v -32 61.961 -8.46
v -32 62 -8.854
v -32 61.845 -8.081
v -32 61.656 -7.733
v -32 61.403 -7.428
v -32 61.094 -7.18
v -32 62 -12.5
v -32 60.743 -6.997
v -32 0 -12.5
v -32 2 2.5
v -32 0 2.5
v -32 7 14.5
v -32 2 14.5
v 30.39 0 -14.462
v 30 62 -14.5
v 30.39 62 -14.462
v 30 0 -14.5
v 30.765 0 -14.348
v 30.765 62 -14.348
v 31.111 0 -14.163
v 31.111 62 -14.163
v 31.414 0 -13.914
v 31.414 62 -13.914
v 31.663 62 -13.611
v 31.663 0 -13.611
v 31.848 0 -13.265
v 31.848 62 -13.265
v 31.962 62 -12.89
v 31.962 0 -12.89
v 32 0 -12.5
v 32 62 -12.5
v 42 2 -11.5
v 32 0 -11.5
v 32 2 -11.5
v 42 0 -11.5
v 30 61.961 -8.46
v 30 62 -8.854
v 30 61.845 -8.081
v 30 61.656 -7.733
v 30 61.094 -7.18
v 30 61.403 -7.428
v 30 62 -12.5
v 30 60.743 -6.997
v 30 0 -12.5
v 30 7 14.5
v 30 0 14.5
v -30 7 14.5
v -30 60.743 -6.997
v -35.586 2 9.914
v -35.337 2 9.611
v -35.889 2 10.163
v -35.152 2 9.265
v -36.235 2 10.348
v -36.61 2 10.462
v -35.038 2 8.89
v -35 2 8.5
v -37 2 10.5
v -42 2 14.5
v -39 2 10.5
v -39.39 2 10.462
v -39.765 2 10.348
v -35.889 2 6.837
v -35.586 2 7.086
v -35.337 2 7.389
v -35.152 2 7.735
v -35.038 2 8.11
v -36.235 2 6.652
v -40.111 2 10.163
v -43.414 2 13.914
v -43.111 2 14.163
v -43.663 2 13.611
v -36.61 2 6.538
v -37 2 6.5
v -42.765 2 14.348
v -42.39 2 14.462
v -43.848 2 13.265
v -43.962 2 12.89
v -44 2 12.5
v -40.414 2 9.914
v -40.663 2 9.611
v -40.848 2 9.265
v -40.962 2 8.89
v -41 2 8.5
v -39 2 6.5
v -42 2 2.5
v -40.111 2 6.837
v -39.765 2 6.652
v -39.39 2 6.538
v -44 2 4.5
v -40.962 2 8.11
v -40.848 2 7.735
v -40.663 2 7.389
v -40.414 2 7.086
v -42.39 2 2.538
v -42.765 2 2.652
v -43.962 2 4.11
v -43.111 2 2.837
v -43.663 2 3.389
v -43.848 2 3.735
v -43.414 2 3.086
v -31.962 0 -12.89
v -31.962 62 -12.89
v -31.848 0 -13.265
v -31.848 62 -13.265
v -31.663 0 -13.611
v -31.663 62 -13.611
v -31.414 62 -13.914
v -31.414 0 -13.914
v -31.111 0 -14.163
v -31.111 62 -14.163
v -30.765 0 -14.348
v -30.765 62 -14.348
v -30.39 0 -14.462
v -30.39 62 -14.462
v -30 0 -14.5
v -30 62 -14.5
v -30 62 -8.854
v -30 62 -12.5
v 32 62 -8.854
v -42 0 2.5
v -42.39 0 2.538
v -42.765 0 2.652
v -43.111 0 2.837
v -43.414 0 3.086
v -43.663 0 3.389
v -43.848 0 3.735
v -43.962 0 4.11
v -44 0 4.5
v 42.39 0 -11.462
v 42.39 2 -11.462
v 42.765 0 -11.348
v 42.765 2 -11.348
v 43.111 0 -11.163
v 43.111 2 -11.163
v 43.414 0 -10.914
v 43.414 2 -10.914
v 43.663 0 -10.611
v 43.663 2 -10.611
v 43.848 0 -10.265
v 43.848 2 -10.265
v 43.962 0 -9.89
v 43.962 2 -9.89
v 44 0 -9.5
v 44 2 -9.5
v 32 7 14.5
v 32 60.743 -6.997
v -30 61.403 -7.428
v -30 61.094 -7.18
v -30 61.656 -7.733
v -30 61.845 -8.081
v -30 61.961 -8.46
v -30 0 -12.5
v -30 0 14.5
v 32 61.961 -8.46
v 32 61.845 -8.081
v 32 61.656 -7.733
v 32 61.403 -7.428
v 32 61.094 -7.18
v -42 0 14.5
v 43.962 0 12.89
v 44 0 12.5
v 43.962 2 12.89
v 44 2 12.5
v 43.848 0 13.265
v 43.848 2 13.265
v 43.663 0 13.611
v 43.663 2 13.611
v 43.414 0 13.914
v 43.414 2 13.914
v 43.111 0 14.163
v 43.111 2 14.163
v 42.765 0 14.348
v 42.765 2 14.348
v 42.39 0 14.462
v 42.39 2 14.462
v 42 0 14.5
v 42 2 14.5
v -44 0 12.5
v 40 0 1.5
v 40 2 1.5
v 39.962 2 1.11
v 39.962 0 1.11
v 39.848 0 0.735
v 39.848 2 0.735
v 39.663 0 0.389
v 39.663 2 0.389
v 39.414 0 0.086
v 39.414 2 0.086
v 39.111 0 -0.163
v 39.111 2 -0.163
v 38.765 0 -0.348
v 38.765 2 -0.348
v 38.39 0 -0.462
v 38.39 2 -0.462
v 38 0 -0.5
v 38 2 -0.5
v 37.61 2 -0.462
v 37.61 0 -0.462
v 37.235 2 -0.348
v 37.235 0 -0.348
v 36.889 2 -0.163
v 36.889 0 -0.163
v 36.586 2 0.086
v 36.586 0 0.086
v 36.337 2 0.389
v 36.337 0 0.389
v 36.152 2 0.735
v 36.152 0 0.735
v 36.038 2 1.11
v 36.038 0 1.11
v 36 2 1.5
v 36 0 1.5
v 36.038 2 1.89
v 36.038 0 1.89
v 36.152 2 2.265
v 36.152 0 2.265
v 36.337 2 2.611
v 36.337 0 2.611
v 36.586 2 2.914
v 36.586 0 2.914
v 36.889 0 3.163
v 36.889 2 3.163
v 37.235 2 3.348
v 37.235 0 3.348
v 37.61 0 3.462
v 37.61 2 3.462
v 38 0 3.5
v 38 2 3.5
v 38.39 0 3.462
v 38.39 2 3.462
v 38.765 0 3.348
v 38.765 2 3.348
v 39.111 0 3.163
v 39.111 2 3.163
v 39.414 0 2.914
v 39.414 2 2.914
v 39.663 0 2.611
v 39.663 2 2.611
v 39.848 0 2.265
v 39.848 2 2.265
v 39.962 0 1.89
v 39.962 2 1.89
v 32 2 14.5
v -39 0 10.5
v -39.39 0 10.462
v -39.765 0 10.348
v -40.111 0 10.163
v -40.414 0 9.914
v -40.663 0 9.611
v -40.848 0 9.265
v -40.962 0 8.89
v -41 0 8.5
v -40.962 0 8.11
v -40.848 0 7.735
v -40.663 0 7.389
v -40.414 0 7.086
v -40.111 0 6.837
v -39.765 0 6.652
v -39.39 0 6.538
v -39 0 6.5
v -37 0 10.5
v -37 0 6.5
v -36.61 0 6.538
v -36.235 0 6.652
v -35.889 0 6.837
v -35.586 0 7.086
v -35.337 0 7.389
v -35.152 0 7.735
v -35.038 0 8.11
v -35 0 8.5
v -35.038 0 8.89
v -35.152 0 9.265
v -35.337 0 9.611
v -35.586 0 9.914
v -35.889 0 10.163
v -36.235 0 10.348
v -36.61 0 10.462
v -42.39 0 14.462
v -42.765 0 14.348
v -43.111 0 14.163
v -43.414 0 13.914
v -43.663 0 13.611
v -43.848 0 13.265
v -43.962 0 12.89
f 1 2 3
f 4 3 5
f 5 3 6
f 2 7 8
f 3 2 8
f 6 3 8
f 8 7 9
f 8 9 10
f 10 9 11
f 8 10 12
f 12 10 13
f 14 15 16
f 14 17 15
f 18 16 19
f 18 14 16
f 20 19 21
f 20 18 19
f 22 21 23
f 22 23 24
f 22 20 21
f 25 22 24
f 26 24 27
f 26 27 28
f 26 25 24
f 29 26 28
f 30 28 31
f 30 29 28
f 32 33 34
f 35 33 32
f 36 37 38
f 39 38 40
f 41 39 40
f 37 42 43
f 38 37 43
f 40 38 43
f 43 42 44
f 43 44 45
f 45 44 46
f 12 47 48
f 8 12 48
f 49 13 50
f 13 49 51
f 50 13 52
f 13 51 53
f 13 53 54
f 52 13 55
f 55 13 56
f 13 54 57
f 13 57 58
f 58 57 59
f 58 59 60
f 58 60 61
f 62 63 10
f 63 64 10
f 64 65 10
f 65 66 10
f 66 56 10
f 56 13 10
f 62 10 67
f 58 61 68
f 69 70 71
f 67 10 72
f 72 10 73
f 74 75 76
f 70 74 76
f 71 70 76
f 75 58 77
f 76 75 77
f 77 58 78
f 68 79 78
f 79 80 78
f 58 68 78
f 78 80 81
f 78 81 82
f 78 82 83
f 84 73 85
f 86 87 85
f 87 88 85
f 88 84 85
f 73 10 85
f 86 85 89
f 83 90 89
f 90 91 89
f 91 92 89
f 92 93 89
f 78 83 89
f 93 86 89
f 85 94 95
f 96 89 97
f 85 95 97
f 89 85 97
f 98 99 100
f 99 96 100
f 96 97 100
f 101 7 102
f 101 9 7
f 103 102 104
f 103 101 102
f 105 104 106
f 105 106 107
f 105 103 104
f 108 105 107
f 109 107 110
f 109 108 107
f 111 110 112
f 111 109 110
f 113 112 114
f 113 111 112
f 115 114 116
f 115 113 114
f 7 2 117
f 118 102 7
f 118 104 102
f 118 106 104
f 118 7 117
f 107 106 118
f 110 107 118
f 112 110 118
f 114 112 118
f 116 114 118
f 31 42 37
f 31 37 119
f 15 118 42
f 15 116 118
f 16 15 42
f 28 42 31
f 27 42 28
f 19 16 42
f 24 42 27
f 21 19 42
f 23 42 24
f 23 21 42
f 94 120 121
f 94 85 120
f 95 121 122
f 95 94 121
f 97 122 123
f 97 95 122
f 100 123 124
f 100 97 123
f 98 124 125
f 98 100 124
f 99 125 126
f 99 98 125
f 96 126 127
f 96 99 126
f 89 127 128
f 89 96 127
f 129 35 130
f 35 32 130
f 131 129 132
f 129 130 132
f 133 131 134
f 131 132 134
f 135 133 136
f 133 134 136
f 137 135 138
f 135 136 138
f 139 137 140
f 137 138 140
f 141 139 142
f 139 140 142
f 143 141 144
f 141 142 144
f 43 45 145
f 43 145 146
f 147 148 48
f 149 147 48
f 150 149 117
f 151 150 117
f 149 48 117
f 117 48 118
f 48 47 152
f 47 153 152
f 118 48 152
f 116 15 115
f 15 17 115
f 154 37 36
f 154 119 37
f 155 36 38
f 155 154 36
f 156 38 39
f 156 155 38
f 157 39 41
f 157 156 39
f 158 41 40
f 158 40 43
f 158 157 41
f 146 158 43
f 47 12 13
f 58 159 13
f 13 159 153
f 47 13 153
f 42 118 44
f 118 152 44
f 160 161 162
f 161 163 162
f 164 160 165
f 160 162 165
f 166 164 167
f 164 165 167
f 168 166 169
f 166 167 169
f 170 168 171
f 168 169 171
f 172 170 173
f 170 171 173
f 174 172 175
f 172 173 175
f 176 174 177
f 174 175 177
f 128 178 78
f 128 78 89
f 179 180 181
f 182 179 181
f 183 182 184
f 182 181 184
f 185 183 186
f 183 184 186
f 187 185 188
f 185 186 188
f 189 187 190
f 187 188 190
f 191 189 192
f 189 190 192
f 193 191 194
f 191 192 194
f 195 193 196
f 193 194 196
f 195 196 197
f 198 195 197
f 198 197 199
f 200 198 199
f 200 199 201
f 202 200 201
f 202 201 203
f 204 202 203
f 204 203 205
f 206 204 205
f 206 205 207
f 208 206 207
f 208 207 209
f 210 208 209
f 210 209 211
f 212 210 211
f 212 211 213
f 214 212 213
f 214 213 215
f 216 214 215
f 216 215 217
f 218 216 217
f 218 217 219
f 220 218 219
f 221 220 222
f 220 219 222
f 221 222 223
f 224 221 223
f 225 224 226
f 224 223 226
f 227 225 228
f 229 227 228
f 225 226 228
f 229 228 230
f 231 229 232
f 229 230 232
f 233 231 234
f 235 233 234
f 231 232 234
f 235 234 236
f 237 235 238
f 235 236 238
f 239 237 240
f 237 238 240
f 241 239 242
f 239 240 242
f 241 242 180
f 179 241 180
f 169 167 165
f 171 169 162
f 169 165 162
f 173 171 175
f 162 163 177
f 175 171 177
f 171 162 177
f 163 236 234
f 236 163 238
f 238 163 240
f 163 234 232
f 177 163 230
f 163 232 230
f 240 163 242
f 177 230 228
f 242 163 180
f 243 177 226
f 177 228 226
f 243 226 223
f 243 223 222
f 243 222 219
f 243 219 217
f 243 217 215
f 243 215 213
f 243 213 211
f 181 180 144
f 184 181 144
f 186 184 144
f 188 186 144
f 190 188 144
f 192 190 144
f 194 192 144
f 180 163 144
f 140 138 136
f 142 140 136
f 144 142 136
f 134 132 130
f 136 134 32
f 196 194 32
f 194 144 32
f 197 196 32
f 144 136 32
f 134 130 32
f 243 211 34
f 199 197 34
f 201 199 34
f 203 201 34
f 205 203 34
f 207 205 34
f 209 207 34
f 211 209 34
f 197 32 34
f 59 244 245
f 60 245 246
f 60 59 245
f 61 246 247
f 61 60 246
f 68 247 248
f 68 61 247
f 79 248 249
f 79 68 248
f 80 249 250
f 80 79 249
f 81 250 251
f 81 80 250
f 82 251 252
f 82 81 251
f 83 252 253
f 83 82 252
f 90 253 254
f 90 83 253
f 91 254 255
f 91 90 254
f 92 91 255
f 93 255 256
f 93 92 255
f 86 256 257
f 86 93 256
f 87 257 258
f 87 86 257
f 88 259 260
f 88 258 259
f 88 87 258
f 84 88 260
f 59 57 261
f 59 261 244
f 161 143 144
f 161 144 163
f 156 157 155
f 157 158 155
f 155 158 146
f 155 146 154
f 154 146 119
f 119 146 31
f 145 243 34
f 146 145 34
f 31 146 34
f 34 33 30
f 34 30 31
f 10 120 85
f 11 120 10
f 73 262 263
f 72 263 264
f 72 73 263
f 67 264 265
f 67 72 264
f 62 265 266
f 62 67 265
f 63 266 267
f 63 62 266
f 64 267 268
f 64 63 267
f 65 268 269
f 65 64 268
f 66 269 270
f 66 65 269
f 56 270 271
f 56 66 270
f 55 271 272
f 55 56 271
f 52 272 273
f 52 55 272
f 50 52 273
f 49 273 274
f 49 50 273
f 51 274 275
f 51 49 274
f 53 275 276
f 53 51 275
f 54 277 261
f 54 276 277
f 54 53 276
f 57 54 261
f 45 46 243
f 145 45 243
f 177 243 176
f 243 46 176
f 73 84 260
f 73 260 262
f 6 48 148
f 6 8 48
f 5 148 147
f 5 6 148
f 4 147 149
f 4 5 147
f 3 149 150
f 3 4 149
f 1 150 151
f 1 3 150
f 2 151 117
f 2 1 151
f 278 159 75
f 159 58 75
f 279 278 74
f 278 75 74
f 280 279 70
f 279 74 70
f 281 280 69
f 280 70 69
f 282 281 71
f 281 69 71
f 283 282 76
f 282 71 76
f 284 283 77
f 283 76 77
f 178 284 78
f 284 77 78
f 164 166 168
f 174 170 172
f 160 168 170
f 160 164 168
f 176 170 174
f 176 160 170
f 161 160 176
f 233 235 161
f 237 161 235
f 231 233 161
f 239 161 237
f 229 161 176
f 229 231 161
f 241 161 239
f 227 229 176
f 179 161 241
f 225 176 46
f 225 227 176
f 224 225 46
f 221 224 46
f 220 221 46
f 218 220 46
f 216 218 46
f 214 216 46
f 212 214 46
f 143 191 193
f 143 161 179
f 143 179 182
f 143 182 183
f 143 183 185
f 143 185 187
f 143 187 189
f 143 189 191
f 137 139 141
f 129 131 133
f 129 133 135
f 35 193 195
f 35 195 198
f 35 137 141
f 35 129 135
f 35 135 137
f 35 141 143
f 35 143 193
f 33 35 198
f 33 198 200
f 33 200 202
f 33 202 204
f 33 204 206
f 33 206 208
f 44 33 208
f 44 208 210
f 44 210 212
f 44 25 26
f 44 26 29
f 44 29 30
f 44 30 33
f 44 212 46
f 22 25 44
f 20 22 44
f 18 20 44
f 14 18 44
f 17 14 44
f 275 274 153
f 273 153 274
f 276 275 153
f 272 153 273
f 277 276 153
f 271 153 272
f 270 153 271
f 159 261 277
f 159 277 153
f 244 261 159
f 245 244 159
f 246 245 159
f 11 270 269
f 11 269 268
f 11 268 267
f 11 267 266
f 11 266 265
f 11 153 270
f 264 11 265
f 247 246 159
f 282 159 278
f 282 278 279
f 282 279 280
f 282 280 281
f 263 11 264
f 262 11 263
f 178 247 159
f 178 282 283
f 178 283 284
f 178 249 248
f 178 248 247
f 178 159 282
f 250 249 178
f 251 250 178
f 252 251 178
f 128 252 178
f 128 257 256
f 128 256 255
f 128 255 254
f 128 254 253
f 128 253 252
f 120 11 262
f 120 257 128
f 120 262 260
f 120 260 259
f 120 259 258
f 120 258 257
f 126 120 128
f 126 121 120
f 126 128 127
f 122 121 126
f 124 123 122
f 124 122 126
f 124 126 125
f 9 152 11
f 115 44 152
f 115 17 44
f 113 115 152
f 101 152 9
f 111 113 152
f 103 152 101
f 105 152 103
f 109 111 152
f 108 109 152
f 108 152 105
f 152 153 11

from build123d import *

# Parameters (mm, degrees)
SALIENTE_EXTRUIR1_DEPTH    = 2
SALIENTE_EXTRUIR2_DEPTH    = 60
CORTAR_EXTRUIR1_DEPTH      = 45
CORTAR_EXTRUIR1_DEPTH_BACK = 45
CROQUIS4_R                 = 2
CORTAR_EXTRUIR2_DEPTH      = 3
REDONDEO1_R                = 2


with BuildPart() as part:
    # Croquis1 → Saliente-Extruir1 (new body)
    with BuildSketch(Plane(origin=(0, 0, 0), x_dir=(1, 0, 0), z_dir=(0, 1, 0))):
        Polygon((-32, -2.5), (-32, 14.5), (32, 14.5), (32, 11.5), (44, 11.5), (44, -14.5), (30, -14.5), (30, 12.5), (-30, 12.5), (-30, -14.5), (-44, -14.5), (-44, -2.5), align=None)
    extrude(amount=SALIENTE_EXTRUIR1_DEPTH)

    # Croquis2 → Saliente-Extruir2 (add)
    with BuildSketch(Plane(origin=(0, 2, 0), x_dir=(1, 0, 0), z_dir=(0, 1, 0))):
        Polygon((-32, 14.5), (-32, -2.5), (-32, -14.5), (-30, -14.5), (-30, 12.5), (30, 12.5), (30, -14.5), (32, -14.5), (32, 14.5), align=None)
    extrude(amount=SALIENTE_EXTRUIR2_DEPTH)

    # Croquis3 → Cortar-Extruir1 (cut, two sides)
    with BuildSketch(Plane(origin=(0, 0, 0), x_dir=(0, 0, -1), z_dir=(1, 0, 0))) as cortar_extruir1_sk:
        Polygon((-14.5, 7), (7.5, 62), (-14.5, 62), align=None)
    extrude(amount=CORTAR_EXTRUIR1_DEPTH, mode=Mode.SUBTRACT)
    extrude(cortar_extruir1_sk.sketch, amount=-CORTAR_EXTRUIR1_DEPTH_BACK, mode=Mode.SUBTRACT)

    # Croquis4 → Cortar-Extruir2 (cut, through all)
    with BuildSketch(Plane(origin=(0, 2, 0), x_dir=(1, 0, 0), z_dir=(0, 1, 0))):
        with Locations((38, -1.5)):
            Circle(CROQUIS4_R)
        with BuildLine():
            Line((-39, -6.5), (-37, -6.5))
            ThreePointArc((-37, -6.5), (-35, -8.5), (-37, -10.5))
            Line((-37, -10.5), (-39, -10.5))
            ThreePointArc((-39, -10.5), (-41, -8.5), (-39, -6.5))
        make_face()
    extrude(amount=-CORTAR_EXTRUIR2_DEPTH, mode=Mode.SUBTRACT)

    # Redondeo1
    redondeo1_edges = [part.edges().sort_by_distance(p)[0] for p in [
        (44, 1, -11.5),
        (44, 1, 14.5),
        (-44, 1, 14.5),
        (-44, 1, 2.5),
        (-32, 31, -14.5),
        (32, 31, -14.5),
        (-31, 62, -7.5),
        (31, 62, -7.5),
    ]]
    fillet(redondeo1_edges, radius=REDONDEO1_R)


solid = part.part
